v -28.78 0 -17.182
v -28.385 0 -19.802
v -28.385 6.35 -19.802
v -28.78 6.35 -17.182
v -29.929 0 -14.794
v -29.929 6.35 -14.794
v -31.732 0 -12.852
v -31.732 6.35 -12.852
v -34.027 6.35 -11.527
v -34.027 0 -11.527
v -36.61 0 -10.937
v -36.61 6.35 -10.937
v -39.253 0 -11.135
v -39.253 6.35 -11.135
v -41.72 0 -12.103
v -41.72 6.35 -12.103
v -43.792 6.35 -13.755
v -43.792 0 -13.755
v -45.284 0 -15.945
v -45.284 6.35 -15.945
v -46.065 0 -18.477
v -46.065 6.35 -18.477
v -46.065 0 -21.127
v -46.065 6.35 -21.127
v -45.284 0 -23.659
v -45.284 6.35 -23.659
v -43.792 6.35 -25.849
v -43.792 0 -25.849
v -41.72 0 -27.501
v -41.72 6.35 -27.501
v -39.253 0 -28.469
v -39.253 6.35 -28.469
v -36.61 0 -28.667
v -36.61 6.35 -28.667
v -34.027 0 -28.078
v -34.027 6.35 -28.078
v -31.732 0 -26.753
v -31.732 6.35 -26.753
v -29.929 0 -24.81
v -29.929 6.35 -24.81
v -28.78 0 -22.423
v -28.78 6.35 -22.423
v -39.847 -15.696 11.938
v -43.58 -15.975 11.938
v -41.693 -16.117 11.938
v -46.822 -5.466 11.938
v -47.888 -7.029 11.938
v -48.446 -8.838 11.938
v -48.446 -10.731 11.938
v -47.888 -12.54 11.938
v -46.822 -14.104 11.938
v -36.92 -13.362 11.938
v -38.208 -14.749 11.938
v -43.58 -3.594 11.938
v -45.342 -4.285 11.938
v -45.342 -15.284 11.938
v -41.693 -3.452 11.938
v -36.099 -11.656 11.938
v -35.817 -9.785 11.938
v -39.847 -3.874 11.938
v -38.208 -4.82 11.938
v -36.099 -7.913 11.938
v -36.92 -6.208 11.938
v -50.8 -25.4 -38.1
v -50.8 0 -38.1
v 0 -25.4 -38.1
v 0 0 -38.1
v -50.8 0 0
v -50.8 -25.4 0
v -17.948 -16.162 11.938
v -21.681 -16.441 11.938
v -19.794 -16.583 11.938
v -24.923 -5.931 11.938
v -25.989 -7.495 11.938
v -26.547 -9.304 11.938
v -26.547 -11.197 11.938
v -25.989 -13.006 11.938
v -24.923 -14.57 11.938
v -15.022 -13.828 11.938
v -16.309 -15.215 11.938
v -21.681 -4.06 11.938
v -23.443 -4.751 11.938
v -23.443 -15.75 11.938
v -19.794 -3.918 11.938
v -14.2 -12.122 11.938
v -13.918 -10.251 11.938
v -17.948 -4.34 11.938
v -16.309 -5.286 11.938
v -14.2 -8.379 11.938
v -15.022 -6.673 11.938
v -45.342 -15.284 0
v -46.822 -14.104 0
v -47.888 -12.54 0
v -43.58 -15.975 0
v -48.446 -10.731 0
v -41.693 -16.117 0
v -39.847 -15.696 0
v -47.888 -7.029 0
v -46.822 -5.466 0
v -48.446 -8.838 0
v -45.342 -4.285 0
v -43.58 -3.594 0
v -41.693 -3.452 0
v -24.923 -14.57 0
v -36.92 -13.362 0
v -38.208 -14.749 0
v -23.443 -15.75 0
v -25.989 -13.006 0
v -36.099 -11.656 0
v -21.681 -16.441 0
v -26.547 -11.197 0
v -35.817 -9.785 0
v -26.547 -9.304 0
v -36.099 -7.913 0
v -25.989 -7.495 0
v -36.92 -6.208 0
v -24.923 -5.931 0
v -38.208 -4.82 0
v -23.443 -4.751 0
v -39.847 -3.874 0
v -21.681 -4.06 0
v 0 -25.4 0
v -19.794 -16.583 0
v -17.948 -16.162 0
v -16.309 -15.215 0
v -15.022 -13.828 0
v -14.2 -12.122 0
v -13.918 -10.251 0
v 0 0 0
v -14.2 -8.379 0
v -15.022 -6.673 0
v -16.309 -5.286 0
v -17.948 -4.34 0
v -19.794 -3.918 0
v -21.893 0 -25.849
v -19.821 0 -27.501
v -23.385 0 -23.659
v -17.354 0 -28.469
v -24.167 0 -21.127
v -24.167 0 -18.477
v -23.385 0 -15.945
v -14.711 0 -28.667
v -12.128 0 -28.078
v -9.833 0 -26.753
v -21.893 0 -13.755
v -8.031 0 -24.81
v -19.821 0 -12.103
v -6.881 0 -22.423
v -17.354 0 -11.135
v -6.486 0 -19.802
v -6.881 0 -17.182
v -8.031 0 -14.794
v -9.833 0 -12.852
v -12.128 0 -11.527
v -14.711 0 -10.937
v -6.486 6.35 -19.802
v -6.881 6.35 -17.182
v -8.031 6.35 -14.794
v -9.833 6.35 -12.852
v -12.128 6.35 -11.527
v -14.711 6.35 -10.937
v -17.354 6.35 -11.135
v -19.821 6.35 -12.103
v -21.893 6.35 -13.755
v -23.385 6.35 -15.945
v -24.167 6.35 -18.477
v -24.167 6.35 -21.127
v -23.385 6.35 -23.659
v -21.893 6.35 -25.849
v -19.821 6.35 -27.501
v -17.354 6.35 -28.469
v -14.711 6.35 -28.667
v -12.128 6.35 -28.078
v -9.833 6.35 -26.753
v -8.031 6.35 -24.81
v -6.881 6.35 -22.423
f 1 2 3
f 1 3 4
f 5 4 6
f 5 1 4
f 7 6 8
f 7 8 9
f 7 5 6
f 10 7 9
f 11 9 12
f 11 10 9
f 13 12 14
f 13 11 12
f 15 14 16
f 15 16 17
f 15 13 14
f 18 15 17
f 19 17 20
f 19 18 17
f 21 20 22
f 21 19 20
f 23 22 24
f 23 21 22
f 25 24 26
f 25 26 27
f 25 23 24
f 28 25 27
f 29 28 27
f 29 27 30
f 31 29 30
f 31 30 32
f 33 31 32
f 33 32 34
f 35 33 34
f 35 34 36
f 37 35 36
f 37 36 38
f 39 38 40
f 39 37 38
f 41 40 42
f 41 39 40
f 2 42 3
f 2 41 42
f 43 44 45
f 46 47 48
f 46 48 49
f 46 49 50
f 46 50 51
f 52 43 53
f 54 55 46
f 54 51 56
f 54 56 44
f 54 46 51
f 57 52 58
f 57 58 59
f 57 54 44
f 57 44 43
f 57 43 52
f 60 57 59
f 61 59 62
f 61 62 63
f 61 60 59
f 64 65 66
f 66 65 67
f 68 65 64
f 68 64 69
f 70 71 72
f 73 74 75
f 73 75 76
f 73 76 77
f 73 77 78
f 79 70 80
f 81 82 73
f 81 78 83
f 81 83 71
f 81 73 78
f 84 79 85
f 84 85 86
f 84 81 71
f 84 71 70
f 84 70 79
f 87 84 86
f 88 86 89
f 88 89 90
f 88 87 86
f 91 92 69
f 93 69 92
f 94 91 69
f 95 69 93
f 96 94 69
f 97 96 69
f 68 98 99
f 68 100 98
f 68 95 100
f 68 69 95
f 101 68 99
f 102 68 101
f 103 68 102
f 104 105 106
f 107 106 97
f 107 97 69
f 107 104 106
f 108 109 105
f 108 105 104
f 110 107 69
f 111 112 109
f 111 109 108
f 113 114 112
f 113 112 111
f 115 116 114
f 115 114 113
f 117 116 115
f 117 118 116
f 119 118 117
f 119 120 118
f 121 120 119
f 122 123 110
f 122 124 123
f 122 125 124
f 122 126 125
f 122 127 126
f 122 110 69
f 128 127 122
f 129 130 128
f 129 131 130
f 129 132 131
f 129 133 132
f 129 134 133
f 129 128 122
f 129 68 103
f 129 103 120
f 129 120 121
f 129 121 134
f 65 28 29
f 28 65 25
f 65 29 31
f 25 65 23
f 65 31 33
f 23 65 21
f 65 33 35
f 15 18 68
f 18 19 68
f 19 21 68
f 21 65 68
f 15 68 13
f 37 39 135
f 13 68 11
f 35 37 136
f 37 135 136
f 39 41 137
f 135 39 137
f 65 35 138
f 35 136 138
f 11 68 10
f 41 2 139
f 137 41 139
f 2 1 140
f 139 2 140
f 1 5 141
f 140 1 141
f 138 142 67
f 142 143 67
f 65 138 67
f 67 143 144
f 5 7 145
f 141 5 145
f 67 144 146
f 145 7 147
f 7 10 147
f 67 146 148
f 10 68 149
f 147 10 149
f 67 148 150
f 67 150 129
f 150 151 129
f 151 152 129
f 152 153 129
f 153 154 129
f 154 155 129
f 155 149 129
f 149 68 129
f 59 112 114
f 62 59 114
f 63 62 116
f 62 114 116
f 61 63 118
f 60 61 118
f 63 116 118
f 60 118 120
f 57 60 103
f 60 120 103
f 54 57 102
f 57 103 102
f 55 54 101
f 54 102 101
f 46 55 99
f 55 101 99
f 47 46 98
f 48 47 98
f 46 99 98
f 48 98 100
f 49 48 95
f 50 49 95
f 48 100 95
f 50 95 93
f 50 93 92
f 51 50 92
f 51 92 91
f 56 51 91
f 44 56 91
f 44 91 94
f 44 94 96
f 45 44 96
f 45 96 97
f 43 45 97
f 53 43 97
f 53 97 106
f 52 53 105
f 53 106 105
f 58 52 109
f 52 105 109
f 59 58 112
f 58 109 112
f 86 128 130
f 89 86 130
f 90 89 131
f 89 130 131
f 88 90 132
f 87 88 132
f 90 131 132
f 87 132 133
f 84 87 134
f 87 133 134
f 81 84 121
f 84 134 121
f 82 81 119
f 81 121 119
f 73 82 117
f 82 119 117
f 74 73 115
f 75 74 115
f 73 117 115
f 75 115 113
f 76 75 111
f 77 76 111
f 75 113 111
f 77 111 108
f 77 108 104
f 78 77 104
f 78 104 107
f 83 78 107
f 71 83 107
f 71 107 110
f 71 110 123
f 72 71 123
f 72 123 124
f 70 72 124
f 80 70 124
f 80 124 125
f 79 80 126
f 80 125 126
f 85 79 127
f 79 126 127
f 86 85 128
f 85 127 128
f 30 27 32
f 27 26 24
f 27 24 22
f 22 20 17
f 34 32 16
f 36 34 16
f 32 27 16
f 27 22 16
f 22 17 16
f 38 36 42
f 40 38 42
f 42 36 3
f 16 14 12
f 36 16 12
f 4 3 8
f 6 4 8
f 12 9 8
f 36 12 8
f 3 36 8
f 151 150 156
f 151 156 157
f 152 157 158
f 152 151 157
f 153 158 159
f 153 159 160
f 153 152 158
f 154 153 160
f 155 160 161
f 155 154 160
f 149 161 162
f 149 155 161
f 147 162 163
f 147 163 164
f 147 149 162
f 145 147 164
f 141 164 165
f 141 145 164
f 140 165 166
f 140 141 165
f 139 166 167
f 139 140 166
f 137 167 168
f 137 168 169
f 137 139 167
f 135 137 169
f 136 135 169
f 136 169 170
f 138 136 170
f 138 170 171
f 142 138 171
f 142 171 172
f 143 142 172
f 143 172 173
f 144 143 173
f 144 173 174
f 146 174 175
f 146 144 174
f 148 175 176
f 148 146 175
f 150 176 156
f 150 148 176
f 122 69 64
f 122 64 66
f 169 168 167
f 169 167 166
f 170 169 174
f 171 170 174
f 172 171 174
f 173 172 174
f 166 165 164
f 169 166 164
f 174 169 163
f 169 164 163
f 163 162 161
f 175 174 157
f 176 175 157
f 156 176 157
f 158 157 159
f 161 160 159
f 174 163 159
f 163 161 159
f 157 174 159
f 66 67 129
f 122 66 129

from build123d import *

# Parameters (mm, degrees)
F0_W     = 50.8
F0_H     = 38.1
F1_DEPTH = 25.4
F2_R     = 6.35
F3_DEPTH = 11.938
F4_R     = 8.89
F5_DEPTH = 6.35


with BuildPart() as f1:
    # F0 (on Front) → F1 (new body)
    with BuildSketch(Plane.XZ):
        with Locations((-25.4, -19.05)):
            Rectangle(F0_W, F0_H)
    extrude(amount=F1_DEPTH)

    # F2 (on Top) → F3 (join)
    with BuildSketch(Plane.XY):
        with Locations((-42.16706, -9.784626)):
            Circle(F2_R)
        with Locations((-20.268146, -10.25056)):
            Circle(F2_R)
    extrude(amount=F3_DEPTH)

    # F4 (on Front) → F5 (join)
    with BuildSketch(Plane.XZ):
        with Locations((-15.375839, -19.802213)):
            Circle(F4_R)
        with Locations((-37.274752, -19.802213)):
            Circle(F4_R)
    extrude(amount=-F5_DEPTH)


solid = f1.part
